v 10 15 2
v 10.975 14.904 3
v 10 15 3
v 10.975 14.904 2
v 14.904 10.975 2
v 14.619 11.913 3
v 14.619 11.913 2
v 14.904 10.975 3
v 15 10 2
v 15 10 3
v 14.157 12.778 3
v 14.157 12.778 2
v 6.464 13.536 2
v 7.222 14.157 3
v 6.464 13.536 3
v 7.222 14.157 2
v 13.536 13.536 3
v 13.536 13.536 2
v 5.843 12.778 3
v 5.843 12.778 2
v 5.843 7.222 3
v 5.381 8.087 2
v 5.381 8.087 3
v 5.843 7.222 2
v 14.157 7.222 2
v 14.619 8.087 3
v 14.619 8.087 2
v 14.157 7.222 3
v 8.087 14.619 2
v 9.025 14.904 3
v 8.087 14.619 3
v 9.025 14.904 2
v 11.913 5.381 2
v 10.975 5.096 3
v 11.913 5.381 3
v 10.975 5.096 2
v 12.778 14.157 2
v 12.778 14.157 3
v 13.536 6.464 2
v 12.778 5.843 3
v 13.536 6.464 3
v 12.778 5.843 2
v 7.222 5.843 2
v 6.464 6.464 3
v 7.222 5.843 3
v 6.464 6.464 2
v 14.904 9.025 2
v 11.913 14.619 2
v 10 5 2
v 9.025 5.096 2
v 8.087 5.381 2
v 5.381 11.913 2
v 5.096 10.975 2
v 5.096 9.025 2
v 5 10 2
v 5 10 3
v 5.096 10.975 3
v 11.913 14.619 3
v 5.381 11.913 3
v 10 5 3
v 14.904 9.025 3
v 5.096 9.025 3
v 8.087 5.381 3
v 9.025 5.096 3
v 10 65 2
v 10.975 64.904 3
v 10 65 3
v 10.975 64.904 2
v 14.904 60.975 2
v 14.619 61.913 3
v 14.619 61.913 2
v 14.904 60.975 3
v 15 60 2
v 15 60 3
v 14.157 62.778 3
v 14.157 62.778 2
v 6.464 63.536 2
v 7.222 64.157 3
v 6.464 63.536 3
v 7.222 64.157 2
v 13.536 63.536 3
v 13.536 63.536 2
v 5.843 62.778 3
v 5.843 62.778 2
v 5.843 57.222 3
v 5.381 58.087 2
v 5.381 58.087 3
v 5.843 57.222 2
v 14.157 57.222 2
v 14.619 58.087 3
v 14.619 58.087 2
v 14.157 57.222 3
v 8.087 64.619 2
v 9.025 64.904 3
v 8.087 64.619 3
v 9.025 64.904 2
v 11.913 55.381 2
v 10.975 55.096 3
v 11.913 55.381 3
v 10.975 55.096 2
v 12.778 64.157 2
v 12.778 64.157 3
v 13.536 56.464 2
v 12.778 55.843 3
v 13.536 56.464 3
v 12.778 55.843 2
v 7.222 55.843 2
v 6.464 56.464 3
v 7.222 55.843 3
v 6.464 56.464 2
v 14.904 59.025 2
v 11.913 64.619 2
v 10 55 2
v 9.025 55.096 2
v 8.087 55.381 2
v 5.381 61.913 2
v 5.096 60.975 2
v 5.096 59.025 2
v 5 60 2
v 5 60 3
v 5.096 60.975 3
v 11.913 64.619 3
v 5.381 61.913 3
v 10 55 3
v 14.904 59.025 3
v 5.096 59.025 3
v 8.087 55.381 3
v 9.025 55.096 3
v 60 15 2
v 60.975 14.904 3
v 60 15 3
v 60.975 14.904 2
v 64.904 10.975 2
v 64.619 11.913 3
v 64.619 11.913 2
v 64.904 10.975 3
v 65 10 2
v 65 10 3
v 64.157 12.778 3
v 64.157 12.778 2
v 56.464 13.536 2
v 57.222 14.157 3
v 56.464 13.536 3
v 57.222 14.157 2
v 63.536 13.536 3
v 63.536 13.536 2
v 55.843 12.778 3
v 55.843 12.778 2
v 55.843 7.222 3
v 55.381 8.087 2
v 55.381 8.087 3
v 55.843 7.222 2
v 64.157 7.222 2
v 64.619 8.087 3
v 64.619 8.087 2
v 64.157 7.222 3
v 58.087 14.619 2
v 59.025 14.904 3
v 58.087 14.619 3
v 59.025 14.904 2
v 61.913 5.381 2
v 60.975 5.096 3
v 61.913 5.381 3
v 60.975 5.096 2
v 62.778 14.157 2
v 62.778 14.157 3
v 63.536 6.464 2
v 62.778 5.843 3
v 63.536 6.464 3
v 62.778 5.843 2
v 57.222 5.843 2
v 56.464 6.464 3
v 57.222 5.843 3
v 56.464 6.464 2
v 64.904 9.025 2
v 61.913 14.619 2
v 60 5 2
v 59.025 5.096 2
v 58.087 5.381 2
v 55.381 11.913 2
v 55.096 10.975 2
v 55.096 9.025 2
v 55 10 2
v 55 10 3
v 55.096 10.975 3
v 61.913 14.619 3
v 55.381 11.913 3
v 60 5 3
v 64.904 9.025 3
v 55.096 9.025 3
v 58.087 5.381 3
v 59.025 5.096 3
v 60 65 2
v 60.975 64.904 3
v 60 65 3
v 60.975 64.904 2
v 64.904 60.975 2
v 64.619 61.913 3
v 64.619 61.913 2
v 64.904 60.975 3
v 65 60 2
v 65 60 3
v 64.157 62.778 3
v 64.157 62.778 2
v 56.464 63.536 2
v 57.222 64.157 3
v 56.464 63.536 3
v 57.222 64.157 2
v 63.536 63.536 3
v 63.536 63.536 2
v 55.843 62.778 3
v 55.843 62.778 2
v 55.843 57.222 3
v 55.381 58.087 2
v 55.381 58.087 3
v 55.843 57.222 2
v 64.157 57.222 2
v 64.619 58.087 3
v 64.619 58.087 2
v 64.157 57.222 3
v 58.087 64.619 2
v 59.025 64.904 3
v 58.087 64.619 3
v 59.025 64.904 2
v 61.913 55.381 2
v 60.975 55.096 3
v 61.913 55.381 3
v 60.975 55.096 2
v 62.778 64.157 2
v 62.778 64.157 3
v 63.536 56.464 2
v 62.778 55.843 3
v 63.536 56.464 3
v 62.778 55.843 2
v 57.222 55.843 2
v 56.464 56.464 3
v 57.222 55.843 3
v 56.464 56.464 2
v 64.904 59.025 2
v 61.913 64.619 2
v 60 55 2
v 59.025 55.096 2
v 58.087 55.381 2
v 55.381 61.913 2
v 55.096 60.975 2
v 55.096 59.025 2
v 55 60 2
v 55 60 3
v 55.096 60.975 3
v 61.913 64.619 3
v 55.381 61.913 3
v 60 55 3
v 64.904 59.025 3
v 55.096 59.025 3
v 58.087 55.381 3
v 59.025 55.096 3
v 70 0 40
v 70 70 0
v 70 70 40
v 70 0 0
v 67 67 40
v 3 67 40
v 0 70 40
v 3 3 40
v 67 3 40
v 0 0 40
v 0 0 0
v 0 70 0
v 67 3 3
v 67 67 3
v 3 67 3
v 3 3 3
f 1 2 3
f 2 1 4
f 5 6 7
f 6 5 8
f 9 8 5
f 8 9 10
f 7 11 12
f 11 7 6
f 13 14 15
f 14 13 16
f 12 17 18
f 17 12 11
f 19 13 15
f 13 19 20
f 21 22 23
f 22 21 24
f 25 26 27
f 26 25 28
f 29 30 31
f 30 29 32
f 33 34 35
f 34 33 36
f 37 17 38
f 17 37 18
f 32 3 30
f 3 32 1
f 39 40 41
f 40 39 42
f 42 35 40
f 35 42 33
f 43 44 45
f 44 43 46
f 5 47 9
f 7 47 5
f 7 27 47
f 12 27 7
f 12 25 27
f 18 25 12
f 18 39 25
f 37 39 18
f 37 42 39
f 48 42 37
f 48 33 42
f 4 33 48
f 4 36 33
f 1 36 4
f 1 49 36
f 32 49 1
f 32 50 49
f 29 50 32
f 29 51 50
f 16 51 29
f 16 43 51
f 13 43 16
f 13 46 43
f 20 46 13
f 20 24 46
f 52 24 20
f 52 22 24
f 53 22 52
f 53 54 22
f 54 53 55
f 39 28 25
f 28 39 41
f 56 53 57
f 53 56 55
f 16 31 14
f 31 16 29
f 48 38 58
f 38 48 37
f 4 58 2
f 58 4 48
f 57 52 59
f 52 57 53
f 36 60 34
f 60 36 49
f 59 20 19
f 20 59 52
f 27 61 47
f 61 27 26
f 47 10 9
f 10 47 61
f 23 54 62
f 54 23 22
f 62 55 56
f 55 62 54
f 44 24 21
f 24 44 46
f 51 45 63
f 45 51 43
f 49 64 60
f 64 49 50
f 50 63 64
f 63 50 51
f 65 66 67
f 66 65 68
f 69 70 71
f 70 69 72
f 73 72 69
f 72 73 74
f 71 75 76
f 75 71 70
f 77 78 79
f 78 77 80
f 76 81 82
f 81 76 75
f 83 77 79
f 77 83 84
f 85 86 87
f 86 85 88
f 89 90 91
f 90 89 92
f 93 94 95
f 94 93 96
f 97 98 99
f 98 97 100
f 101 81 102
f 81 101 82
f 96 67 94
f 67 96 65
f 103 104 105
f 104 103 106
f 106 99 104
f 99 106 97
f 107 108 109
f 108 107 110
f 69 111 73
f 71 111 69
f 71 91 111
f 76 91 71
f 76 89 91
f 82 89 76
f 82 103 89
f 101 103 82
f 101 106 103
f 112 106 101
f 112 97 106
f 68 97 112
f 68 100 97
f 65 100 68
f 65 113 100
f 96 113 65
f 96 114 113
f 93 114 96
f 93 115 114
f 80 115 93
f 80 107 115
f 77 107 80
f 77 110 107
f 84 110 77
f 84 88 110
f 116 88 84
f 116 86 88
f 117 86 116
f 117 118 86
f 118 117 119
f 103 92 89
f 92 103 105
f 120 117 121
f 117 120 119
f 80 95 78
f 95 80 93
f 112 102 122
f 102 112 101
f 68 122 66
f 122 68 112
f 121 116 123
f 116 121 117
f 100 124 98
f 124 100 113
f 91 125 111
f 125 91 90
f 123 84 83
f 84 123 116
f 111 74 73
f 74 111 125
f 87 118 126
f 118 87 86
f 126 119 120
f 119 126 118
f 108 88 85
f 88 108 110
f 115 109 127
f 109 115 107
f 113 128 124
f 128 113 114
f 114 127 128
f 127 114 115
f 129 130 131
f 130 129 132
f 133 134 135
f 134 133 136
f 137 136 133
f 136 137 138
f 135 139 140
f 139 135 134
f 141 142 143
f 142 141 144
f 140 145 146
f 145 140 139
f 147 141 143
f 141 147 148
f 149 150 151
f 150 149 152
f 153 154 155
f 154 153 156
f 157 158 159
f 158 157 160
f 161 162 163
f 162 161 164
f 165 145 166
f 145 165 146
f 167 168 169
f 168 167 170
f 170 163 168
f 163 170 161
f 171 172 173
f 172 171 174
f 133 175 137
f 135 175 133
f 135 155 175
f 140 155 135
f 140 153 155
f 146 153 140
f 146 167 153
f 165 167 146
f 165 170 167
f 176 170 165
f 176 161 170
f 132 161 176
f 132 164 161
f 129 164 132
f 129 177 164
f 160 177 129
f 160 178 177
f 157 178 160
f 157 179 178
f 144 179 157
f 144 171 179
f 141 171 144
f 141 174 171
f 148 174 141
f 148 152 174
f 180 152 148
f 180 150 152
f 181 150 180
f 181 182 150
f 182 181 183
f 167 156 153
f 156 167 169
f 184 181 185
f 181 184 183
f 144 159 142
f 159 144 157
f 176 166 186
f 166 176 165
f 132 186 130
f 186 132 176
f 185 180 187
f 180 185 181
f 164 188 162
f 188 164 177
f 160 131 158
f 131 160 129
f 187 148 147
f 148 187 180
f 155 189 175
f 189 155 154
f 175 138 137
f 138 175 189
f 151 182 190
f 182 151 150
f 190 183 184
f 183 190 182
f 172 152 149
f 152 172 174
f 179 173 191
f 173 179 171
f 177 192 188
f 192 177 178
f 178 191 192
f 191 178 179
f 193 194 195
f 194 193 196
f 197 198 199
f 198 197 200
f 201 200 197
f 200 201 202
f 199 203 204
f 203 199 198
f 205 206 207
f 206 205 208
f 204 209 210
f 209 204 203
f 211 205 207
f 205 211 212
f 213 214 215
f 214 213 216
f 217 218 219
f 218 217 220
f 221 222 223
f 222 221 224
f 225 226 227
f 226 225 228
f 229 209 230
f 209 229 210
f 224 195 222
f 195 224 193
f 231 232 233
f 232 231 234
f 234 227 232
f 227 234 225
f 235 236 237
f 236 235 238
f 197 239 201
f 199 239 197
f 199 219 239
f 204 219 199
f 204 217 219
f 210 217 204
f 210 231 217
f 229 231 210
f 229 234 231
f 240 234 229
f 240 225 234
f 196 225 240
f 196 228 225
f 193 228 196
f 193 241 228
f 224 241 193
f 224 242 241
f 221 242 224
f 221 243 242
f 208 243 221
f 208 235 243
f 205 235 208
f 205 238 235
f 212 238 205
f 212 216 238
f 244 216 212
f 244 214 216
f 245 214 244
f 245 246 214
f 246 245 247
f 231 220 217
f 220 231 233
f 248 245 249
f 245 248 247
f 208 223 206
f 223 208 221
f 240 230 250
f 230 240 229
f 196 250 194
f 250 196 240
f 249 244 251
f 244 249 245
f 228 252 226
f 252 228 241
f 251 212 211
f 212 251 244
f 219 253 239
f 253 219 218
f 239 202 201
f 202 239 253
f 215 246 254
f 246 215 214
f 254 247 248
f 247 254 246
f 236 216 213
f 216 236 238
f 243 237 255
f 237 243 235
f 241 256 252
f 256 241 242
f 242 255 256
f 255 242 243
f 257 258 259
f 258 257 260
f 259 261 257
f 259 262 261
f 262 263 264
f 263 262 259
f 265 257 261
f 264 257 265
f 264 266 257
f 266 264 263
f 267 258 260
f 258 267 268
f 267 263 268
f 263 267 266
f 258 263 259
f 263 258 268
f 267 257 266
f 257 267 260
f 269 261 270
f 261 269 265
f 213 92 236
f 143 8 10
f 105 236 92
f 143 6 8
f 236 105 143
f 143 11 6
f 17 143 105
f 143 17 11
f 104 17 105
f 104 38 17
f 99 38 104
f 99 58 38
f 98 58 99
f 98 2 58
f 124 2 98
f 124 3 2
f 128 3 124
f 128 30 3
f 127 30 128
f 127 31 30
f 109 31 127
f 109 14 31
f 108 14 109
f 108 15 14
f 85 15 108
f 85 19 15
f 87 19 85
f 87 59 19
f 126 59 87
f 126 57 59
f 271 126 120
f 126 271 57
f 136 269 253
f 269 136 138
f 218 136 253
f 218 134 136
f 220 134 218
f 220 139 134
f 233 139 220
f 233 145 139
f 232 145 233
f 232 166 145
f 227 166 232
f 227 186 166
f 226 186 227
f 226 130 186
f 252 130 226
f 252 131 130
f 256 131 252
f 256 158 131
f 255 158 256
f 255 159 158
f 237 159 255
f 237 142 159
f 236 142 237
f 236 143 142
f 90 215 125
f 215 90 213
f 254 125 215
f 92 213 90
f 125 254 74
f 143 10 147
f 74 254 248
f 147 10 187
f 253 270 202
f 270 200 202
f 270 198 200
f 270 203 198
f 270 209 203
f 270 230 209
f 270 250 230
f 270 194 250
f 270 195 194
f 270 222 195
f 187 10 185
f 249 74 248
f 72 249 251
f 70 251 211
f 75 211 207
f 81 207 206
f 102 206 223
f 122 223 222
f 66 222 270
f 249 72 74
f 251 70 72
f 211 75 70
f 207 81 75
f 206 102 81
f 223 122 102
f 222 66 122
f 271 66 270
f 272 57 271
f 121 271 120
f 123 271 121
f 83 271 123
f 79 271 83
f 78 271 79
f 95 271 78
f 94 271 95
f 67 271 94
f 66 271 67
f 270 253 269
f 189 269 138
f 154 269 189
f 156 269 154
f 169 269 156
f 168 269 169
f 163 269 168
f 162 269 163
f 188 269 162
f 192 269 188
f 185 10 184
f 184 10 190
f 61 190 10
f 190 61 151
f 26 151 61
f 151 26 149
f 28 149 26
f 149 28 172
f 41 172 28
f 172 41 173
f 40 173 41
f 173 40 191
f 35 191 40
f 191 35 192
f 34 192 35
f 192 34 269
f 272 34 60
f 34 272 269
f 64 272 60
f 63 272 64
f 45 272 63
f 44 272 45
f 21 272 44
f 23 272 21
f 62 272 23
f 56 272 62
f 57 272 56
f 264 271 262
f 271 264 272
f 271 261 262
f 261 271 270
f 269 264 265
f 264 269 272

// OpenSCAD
$fn = 32;

// ----------------------------------------------------------------------
// Enclosure box: bosses enclosure
// ----------------------------------------------------------------------

// --- parameters (mm) ---
box_l = 70;               // outer length, X
box_w = 70;               // outer width, Y
box_h = 40;               // outer height
wall_t = 3;               // wall thickness
boss_r = 5;               // corner boss radius
hole_r = 2;               // boss screw hole radius
boss_in = 10;             // boss inset from the corners

inner_h = box_h - wall_t;  // cavity depth
boss_h = inner_h - 2;  // corner boss height

difference() {
  cube([box_l, box_w, box_h]);
  translate([wall_t, wall_t, wall_t])
    cube([box_l - 2 * wall_t, box_w - 2 * wall_t, box_h]);
  for (sx = [0, 1], sy = [0, 1])
    translate([sx ? box_l - boss_in : boss_in,
               sy ? box_w - boss_in : boss_in, wall_t - 1]) {
      cylinder(r = boss_r, h = boss_h);
      translate([0, 0, boss_h - 4])
        cylinder(r = hole_r, h = 5);
    }
}
